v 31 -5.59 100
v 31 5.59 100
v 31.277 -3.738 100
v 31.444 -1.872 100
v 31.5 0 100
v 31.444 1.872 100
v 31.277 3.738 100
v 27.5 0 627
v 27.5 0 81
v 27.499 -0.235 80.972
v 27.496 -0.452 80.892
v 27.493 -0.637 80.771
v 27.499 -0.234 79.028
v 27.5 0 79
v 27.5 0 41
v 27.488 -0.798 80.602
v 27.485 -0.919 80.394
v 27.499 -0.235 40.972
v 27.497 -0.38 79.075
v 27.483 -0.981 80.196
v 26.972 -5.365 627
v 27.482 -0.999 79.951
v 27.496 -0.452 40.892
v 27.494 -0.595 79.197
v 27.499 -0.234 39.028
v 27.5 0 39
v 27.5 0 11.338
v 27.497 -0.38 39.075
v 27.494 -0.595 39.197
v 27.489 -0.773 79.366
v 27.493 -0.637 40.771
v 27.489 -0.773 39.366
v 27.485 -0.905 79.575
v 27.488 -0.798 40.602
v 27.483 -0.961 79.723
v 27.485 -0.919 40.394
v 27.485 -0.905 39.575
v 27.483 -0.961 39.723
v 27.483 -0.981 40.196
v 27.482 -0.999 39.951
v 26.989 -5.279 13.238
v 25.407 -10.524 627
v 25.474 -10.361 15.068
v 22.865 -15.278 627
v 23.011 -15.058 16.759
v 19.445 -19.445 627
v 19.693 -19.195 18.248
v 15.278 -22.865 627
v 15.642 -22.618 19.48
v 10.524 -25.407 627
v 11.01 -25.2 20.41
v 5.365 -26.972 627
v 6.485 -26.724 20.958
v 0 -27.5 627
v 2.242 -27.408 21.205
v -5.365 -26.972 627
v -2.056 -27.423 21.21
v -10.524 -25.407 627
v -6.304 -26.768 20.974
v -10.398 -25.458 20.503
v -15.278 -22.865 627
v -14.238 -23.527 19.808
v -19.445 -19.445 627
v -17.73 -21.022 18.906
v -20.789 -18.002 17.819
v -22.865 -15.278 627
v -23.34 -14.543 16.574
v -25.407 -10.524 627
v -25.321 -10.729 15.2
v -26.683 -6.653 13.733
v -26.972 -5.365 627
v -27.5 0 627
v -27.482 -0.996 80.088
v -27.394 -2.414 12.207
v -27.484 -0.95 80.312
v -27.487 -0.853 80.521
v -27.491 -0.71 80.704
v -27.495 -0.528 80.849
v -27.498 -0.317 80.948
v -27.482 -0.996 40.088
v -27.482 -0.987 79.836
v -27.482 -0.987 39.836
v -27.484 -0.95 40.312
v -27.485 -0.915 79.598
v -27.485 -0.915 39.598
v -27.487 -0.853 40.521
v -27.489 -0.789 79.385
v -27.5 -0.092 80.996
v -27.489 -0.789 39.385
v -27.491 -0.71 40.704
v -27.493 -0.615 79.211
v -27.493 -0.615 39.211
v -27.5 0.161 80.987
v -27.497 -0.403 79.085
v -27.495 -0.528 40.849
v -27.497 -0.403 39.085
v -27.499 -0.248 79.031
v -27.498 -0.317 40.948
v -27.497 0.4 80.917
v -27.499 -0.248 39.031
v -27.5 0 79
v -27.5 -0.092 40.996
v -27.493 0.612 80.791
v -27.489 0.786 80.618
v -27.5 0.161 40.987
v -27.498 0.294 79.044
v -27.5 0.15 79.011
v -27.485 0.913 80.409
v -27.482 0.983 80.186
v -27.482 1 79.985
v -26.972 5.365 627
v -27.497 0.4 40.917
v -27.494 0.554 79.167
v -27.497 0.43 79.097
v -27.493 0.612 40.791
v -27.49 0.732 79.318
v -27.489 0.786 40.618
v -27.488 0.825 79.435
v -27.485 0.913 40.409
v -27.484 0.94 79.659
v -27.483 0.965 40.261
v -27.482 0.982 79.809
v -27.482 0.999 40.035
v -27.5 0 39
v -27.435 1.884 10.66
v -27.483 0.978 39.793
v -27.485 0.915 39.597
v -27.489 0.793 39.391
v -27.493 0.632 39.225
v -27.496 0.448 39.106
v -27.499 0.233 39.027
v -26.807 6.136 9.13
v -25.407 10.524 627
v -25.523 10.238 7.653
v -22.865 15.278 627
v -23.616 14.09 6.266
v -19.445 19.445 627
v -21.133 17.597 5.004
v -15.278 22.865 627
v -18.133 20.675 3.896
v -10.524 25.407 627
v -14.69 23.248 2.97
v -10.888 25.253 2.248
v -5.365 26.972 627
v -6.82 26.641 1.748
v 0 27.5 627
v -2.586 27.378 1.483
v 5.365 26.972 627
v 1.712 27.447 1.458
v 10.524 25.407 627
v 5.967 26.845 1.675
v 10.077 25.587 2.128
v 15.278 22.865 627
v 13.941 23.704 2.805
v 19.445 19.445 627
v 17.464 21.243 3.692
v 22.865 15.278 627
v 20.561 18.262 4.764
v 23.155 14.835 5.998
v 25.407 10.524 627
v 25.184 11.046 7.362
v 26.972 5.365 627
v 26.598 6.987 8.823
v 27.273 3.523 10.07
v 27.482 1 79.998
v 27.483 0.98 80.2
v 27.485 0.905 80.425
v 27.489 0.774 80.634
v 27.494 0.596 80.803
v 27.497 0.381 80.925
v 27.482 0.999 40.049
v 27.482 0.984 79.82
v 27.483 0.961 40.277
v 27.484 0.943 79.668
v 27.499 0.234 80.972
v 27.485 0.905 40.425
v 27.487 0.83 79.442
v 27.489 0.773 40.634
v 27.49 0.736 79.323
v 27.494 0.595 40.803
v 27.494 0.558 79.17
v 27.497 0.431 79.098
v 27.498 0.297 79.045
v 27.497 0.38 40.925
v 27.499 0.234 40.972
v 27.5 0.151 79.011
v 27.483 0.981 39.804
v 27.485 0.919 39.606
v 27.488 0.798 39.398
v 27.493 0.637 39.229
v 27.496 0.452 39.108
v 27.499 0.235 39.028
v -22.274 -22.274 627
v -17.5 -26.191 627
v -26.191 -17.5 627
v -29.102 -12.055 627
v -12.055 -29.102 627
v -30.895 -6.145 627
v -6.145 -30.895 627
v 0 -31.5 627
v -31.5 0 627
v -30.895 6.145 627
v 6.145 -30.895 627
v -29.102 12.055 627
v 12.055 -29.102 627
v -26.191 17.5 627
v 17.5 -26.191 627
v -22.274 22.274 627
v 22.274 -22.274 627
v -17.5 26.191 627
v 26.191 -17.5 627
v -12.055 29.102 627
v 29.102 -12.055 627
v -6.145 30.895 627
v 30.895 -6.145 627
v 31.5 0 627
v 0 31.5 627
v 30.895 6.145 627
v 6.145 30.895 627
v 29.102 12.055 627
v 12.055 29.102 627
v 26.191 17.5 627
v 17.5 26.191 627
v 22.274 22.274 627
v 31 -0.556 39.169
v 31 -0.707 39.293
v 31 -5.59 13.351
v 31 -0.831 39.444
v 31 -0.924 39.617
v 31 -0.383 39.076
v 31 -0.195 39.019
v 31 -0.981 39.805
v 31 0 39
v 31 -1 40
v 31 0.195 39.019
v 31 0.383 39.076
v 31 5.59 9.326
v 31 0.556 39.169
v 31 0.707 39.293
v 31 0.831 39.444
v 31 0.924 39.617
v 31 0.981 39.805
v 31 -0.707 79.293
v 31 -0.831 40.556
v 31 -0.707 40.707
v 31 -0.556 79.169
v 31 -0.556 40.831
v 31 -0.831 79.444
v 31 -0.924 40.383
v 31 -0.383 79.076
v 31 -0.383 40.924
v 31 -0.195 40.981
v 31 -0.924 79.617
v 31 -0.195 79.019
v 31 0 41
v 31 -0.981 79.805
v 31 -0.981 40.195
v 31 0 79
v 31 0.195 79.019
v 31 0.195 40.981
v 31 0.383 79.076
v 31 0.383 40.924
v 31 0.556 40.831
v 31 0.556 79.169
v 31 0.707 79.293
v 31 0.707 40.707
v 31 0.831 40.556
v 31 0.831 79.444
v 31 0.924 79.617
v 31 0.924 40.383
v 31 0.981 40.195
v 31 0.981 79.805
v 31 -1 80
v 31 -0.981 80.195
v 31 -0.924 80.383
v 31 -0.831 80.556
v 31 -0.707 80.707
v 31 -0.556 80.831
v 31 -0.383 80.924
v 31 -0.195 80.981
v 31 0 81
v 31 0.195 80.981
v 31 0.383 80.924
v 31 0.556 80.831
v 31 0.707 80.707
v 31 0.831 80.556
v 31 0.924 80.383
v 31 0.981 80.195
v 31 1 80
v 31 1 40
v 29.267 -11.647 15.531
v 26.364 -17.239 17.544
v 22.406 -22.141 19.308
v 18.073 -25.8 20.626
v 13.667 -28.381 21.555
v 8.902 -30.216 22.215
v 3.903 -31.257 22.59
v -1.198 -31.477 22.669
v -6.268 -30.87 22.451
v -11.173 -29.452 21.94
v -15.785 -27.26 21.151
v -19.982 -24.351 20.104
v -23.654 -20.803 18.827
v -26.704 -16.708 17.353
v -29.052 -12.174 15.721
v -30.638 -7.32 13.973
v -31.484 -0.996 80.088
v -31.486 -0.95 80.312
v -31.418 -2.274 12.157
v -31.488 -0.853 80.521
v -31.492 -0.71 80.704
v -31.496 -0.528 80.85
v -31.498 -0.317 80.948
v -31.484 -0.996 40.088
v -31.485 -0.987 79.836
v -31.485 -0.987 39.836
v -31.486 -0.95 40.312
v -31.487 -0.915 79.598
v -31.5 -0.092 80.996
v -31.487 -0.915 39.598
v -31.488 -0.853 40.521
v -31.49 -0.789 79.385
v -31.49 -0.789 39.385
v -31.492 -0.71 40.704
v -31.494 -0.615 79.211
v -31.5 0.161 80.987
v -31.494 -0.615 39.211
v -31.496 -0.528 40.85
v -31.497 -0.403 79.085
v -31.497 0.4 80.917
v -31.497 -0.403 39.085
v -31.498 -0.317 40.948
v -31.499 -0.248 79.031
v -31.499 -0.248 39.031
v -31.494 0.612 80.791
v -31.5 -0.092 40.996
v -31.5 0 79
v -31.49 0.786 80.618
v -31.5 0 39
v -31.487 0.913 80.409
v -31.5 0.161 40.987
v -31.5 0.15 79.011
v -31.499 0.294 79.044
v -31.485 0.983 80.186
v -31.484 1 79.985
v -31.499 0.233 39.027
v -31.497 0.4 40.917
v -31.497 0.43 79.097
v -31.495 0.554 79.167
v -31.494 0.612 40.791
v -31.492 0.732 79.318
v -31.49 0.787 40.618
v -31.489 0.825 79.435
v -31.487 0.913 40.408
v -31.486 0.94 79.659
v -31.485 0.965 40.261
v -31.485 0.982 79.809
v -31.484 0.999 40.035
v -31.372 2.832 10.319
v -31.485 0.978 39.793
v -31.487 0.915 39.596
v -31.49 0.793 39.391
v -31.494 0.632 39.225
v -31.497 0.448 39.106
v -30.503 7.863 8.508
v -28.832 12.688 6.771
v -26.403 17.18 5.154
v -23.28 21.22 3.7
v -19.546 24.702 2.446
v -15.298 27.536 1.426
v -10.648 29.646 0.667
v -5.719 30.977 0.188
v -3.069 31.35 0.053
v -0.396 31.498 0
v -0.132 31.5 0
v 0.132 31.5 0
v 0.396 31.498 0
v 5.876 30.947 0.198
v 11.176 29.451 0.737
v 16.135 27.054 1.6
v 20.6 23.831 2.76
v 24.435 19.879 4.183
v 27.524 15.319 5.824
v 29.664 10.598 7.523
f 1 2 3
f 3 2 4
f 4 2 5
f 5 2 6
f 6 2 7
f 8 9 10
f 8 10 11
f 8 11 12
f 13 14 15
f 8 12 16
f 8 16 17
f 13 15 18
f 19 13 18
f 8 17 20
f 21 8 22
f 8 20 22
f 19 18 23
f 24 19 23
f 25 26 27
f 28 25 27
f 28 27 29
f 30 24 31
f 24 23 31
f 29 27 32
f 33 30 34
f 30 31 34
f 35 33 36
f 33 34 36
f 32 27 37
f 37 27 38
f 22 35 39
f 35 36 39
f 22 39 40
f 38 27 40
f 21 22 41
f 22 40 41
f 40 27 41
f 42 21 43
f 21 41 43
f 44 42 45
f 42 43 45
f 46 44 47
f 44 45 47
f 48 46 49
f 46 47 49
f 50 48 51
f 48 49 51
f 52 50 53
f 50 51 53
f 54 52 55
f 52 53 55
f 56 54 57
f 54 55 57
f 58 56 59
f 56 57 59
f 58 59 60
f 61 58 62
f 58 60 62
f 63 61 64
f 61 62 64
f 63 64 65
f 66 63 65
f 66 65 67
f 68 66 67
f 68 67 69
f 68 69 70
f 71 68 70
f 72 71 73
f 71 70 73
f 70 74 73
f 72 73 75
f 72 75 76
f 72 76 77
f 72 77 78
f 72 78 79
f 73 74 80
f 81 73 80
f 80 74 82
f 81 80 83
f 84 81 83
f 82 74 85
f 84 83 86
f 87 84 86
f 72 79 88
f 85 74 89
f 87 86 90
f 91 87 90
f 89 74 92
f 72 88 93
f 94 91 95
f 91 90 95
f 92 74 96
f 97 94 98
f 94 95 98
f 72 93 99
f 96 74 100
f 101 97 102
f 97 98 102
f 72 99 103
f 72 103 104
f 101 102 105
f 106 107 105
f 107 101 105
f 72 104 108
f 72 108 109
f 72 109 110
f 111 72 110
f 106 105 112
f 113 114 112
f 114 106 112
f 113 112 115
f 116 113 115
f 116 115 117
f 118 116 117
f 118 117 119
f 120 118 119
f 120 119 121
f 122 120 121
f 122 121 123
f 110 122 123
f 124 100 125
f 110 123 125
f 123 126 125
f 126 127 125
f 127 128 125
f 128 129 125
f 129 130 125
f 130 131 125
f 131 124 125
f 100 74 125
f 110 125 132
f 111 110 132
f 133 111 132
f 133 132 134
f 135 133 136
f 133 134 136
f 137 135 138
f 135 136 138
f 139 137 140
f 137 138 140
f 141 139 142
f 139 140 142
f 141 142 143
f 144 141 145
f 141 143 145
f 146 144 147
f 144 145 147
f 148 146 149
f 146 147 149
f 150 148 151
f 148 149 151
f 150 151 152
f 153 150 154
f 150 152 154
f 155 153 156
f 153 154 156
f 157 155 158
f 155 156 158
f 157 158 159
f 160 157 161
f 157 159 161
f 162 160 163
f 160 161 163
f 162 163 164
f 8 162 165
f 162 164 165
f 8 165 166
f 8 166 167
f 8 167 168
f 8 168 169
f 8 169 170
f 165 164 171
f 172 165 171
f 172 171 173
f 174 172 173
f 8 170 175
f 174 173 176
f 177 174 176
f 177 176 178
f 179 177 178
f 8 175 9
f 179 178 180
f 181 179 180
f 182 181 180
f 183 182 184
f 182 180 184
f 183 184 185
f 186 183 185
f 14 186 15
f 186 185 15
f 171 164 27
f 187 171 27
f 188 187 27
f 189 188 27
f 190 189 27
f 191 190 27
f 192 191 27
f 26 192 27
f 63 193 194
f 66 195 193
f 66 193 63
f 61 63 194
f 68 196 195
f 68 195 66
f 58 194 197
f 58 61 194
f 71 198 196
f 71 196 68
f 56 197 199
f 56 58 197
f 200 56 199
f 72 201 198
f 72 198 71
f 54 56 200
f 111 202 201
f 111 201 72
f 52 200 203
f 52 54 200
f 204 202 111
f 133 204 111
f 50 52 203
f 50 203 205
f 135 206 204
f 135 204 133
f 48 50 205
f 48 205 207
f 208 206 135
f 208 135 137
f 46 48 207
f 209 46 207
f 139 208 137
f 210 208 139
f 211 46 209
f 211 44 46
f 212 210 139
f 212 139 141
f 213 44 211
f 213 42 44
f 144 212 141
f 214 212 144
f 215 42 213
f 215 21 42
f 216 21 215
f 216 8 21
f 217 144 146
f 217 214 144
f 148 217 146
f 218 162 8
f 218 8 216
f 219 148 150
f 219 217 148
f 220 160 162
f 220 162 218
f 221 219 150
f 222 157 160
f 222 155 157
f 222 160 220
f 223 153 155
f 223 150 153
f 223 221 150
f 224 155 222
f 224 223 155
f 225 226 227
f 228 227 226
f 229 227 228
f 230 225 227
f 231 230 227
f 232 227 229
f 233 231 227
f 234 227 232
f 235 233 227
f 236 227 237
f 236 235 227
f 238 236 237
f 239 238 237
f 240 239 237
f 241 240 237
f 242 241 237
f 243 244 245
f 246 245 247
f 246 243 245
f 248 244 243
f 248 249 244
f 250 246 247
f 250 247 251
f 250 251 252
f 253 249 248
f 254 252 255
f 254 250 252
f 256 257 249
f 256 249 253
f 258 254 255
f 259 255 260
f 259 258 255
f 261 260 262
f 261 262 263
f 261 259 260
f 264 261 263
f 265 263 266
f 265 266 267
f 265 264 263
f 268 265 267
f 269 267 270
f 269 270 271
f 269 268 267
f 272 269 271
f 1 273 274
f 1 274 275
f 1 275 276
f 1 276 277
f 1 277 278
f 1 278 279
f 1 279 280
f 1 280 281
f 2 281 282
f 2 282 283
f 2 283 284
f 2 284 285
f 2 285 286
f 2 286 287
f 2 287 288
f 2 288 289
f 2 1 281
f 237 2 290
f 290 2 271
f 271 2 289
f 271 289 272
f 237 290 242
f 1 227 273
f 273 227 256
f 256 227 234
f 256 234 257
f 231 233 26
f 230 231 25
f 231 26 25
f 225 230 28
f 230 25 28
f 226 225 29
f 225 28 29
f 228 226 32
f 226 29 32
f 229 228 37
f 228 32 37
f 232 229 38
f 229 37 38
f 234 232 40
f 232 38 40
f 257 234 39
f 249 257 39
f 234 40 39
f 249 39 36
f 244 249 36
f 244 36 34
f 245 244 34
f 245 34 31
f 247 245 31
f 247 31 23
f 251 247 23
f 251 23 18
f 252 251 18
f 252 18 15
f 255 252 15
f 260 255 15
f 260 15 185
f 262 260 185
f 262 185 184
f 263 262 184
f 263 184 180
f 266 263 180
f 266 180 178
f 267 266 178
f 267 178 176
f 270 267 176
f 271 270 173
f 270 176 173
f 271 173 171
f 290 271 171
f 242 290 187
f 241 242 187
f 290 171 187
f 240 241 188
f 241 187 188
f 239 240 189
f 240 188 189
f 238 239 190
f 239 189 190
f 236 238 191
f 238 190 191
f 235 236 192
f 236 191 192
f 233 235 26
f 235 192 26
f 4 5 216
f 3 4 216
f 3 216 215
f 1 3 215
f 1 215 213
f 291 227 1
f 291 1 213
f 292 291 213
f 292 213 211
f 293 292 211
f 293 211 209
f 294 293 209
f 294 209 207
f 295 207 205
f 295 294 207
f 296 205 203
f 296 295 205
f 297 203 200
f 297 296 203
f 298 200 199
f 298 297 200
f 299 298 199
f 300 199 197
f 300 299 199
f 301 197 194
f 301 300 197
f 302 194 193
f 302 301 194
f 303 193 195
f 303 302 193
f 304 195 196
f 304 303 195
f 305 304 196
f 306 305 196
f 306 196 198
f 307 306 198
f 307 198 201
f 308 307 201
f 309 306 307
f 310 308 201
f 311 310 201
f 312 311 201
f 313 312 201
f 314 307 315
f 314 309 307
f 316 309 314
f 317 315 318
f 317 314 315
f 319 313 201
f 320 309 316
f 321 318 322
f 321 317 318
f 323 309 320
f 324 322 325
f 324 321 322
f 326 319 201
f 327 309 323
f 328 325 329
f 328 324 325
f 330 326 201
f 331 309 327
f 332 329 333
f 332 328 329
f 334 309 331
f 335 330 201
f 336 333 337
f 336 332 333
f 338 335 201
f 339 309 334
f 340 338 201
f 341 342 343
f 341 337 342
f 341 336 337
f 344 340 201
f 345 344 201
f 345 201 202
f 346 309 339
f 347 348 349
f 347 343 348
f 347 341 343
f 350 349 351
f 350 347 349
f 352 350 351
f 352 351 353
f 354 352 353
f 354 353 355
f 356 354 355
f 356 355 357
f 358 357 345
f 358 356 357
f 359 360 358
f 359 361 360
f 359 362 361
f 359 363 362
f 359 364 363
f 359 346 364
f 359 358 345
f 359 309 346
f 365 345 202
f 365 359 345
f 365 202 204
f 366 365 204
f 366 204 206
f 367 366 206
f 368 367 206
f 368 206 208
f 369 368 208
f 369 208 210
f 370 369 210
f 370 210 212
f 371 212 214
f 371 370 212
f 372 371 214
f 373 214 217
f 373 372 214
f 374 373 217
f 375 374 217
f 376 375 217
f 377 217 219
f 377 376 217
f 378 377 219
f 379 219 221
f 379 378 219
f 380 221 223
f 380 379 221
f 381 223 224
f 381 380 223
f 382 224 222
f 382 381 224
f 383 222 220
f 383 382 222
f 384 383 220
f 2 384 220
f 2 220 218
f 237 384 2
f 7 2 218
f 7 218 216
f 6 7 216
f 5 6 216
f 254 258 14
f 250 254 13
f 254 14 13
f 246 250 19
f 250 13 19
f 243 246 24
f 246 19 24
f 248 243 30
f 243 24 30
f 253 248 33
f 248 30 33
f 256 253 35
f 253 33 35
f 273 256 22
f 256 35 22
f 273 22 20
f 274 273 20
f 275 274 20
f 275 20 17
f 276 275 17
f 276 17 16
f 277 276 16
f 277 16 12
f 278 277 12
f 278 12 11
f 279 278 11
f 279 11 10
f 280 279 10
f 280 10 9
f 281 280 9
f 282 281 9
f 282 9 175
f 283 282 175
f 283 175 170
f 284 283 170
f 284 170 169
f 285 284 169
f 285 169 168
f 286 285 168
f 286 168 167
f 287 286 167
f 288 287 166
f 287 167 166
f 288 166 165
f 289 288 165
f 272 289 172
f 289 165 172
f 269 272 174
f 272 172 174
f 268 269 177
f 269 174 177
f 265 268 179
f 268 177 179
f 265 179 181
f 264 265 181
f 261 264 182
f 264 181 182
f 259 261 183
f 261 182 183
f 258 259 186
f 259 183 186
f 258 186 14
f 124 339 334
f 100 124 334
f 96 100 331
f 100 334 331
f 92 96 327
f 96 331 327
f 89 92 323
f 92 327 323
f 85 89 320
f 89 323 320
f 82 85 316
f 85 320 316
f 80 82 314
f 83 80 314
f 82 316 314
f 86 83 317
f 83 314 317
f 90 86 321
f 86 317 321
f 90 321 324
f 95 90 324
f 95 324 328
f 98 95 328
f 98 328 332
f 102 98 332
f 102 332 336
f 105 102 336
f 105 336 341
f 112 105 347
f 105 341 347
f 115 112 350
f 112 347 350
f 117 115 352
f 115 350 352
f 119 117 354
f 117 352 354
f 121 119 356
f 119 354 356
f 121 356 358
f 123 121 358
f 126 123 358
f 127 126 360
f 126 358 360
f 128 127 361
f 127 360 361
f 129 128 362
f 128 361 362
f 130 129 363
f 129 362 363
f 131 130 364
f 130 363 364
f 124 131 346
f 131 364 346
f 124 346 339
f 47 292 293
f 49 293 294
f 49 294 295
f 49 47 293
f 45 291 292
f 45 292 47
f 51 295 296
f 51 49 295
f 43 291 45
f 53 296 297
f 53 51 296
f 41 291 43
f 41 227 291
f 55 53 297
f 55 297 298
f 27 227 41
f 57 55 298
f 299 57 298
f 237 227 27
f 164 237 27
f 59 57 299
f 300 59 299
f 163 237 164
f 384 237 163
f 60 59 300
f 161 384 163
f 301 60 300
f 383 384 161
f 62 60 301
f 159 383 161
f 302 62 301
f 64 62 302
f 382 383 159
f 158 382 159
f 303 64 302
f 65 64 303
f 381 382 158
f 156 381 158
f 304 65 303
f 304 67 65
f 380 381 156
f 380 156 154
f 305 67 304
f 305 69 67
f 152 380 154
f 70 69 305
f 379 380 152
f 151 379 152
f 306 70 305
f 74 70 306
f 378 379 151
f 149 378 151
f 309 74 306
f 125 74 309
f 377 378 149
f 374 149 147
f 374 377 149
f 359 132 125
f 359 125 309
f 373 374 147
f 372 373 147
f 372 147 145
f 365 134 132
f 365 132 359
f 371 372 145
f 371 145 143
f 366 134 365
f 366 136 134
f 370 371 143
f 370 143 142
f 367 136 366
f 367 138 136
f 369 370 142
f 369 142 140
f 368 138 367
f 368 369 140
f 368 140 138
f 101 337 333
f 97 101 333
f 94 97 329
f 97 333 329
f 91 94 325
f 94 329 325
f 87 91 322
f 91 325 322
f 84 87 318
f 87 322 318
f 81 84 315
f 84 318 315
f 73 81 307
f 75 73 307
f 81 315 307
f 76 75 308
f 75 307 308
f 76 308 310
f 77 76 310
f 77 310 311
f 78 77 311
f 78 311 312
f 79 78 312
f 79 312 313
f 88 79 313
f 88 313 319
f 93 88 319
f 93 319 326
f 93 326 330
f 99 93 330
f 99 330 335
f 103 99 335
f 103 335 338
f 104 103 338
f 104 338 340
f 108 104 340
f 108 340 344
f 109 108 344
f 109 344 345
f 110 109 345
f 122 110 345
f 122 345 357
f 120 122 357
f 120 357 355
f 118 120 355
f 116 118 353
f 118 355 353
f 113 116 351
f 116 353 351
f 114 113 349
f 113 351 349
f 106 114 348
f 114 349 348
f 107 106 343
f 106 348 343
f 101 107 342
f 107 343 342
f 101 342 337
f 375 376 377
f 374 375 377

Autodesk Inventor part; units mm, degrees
sketch "Sketch1" plane through (0, 0, 0) normal (0, 0, 1) x (1, 0, 0)
  circle A0 centre (0, 0) radius 31.5
  circle A1 centre (0, 0) radius 27.5
  dimension "d0" = 63
  dimension "d2" = 4
extrude "tube" add sketch "Sketch1" along normal blind 627
sketch "Sketch15" plane through (0, 0, 627) normal (0, 0, 1) x (1, 0, 0)
  circle A0 centre (0, 0) radius 27.5 projected
  circle A1 centre (0, 0) radius 31.5 projected
  point P0 (31.5, 0)
ref_plane "Work Plane6" through (31.5, 0, 627) normal (1, 0, 0) x (0, 1, 0)
ref_plane "Work Plane7" through (31, 0, 0) normal (1, 0, 0) x (0, 1, 0)
sketch "Sketch19" plane through (31, 0, 0) normal (1, 0, 0) x (0, 1, 0)
  line L0 (-10, 0) -> (10, 0)
  line L1 (10, 0) -> (10, 100)
  line L2 (10, 100) -> (-10, 100)
  line L3 (-10, 100) -> (-10, 0)
  point P0 (0, 0)
  point P1 (0, 0)
  dimension "d67" = 20
  dimension "d68" = 100
extrude "flatFaceYellow" cut sketch "Sketch19" along normal blind 25.4
sketch "Sketch21" plane through (0, 0, 0) normal (0, 0, -1) x (-1, 0, 0)
  line L0 (-31, 5.5902) -> (-31, -5.5902) projected
  arc A0 (-31, -5.5902) -> (-31, 5.5902) centre (0, 0) ccw projected
  circle A1 centre (0, 0) radius 27.5 projected
  line L1 (0.7293, 31.4916) -> (30.8537, 31.4916) construction
ref_plane "Work Plane8" through (-0.7293, 31.4916, 0) normal (0, -0.3387, -0.9409) x (-1, 0, 0)
sketch "Sketch22" plane through (-0.7293, 31.4916, 0) normal (0, -0.3387, -0.9409) x (-1, 0, 0)
  line L0 (-34.8075, -84.5558) -> (31.7452, -84.5558)
  line L1 (31.7452, -84.5558) -> (31.7452, 8.8585)
  line L2 (31.7452, 8.8585) -> (-34.8075, 8.8585)
  line L3 (-34.8075, 8.8585) -> (-34.8075, -84.5558)
  point P0 (-0.7293, -29.6298)
extrude "angledEnd" cut sketch "Sketch22" along normal blind 25.4
sketch "Sketch23" plane through (31, 0, 0) normal (1, 0, 0) x (0, 0, -1)
  line L0 (-13.3502, -5.5902) -> (-100, -5.5902) projected
  circle A0 centre (-80, 0) radius 3.2074
  circle A1 centre (-40, 0) radius 3.2074
  point P0 (0, 0)
  dimension "d89" = 80
  dimension "d92" = 40
hole "Hole3" at (31, 0, 80) at (31, 0, 40) direction (-1, 0, 0) diameter 2 end through all
properties part number "2p5vss" material "PVC-Piping"
